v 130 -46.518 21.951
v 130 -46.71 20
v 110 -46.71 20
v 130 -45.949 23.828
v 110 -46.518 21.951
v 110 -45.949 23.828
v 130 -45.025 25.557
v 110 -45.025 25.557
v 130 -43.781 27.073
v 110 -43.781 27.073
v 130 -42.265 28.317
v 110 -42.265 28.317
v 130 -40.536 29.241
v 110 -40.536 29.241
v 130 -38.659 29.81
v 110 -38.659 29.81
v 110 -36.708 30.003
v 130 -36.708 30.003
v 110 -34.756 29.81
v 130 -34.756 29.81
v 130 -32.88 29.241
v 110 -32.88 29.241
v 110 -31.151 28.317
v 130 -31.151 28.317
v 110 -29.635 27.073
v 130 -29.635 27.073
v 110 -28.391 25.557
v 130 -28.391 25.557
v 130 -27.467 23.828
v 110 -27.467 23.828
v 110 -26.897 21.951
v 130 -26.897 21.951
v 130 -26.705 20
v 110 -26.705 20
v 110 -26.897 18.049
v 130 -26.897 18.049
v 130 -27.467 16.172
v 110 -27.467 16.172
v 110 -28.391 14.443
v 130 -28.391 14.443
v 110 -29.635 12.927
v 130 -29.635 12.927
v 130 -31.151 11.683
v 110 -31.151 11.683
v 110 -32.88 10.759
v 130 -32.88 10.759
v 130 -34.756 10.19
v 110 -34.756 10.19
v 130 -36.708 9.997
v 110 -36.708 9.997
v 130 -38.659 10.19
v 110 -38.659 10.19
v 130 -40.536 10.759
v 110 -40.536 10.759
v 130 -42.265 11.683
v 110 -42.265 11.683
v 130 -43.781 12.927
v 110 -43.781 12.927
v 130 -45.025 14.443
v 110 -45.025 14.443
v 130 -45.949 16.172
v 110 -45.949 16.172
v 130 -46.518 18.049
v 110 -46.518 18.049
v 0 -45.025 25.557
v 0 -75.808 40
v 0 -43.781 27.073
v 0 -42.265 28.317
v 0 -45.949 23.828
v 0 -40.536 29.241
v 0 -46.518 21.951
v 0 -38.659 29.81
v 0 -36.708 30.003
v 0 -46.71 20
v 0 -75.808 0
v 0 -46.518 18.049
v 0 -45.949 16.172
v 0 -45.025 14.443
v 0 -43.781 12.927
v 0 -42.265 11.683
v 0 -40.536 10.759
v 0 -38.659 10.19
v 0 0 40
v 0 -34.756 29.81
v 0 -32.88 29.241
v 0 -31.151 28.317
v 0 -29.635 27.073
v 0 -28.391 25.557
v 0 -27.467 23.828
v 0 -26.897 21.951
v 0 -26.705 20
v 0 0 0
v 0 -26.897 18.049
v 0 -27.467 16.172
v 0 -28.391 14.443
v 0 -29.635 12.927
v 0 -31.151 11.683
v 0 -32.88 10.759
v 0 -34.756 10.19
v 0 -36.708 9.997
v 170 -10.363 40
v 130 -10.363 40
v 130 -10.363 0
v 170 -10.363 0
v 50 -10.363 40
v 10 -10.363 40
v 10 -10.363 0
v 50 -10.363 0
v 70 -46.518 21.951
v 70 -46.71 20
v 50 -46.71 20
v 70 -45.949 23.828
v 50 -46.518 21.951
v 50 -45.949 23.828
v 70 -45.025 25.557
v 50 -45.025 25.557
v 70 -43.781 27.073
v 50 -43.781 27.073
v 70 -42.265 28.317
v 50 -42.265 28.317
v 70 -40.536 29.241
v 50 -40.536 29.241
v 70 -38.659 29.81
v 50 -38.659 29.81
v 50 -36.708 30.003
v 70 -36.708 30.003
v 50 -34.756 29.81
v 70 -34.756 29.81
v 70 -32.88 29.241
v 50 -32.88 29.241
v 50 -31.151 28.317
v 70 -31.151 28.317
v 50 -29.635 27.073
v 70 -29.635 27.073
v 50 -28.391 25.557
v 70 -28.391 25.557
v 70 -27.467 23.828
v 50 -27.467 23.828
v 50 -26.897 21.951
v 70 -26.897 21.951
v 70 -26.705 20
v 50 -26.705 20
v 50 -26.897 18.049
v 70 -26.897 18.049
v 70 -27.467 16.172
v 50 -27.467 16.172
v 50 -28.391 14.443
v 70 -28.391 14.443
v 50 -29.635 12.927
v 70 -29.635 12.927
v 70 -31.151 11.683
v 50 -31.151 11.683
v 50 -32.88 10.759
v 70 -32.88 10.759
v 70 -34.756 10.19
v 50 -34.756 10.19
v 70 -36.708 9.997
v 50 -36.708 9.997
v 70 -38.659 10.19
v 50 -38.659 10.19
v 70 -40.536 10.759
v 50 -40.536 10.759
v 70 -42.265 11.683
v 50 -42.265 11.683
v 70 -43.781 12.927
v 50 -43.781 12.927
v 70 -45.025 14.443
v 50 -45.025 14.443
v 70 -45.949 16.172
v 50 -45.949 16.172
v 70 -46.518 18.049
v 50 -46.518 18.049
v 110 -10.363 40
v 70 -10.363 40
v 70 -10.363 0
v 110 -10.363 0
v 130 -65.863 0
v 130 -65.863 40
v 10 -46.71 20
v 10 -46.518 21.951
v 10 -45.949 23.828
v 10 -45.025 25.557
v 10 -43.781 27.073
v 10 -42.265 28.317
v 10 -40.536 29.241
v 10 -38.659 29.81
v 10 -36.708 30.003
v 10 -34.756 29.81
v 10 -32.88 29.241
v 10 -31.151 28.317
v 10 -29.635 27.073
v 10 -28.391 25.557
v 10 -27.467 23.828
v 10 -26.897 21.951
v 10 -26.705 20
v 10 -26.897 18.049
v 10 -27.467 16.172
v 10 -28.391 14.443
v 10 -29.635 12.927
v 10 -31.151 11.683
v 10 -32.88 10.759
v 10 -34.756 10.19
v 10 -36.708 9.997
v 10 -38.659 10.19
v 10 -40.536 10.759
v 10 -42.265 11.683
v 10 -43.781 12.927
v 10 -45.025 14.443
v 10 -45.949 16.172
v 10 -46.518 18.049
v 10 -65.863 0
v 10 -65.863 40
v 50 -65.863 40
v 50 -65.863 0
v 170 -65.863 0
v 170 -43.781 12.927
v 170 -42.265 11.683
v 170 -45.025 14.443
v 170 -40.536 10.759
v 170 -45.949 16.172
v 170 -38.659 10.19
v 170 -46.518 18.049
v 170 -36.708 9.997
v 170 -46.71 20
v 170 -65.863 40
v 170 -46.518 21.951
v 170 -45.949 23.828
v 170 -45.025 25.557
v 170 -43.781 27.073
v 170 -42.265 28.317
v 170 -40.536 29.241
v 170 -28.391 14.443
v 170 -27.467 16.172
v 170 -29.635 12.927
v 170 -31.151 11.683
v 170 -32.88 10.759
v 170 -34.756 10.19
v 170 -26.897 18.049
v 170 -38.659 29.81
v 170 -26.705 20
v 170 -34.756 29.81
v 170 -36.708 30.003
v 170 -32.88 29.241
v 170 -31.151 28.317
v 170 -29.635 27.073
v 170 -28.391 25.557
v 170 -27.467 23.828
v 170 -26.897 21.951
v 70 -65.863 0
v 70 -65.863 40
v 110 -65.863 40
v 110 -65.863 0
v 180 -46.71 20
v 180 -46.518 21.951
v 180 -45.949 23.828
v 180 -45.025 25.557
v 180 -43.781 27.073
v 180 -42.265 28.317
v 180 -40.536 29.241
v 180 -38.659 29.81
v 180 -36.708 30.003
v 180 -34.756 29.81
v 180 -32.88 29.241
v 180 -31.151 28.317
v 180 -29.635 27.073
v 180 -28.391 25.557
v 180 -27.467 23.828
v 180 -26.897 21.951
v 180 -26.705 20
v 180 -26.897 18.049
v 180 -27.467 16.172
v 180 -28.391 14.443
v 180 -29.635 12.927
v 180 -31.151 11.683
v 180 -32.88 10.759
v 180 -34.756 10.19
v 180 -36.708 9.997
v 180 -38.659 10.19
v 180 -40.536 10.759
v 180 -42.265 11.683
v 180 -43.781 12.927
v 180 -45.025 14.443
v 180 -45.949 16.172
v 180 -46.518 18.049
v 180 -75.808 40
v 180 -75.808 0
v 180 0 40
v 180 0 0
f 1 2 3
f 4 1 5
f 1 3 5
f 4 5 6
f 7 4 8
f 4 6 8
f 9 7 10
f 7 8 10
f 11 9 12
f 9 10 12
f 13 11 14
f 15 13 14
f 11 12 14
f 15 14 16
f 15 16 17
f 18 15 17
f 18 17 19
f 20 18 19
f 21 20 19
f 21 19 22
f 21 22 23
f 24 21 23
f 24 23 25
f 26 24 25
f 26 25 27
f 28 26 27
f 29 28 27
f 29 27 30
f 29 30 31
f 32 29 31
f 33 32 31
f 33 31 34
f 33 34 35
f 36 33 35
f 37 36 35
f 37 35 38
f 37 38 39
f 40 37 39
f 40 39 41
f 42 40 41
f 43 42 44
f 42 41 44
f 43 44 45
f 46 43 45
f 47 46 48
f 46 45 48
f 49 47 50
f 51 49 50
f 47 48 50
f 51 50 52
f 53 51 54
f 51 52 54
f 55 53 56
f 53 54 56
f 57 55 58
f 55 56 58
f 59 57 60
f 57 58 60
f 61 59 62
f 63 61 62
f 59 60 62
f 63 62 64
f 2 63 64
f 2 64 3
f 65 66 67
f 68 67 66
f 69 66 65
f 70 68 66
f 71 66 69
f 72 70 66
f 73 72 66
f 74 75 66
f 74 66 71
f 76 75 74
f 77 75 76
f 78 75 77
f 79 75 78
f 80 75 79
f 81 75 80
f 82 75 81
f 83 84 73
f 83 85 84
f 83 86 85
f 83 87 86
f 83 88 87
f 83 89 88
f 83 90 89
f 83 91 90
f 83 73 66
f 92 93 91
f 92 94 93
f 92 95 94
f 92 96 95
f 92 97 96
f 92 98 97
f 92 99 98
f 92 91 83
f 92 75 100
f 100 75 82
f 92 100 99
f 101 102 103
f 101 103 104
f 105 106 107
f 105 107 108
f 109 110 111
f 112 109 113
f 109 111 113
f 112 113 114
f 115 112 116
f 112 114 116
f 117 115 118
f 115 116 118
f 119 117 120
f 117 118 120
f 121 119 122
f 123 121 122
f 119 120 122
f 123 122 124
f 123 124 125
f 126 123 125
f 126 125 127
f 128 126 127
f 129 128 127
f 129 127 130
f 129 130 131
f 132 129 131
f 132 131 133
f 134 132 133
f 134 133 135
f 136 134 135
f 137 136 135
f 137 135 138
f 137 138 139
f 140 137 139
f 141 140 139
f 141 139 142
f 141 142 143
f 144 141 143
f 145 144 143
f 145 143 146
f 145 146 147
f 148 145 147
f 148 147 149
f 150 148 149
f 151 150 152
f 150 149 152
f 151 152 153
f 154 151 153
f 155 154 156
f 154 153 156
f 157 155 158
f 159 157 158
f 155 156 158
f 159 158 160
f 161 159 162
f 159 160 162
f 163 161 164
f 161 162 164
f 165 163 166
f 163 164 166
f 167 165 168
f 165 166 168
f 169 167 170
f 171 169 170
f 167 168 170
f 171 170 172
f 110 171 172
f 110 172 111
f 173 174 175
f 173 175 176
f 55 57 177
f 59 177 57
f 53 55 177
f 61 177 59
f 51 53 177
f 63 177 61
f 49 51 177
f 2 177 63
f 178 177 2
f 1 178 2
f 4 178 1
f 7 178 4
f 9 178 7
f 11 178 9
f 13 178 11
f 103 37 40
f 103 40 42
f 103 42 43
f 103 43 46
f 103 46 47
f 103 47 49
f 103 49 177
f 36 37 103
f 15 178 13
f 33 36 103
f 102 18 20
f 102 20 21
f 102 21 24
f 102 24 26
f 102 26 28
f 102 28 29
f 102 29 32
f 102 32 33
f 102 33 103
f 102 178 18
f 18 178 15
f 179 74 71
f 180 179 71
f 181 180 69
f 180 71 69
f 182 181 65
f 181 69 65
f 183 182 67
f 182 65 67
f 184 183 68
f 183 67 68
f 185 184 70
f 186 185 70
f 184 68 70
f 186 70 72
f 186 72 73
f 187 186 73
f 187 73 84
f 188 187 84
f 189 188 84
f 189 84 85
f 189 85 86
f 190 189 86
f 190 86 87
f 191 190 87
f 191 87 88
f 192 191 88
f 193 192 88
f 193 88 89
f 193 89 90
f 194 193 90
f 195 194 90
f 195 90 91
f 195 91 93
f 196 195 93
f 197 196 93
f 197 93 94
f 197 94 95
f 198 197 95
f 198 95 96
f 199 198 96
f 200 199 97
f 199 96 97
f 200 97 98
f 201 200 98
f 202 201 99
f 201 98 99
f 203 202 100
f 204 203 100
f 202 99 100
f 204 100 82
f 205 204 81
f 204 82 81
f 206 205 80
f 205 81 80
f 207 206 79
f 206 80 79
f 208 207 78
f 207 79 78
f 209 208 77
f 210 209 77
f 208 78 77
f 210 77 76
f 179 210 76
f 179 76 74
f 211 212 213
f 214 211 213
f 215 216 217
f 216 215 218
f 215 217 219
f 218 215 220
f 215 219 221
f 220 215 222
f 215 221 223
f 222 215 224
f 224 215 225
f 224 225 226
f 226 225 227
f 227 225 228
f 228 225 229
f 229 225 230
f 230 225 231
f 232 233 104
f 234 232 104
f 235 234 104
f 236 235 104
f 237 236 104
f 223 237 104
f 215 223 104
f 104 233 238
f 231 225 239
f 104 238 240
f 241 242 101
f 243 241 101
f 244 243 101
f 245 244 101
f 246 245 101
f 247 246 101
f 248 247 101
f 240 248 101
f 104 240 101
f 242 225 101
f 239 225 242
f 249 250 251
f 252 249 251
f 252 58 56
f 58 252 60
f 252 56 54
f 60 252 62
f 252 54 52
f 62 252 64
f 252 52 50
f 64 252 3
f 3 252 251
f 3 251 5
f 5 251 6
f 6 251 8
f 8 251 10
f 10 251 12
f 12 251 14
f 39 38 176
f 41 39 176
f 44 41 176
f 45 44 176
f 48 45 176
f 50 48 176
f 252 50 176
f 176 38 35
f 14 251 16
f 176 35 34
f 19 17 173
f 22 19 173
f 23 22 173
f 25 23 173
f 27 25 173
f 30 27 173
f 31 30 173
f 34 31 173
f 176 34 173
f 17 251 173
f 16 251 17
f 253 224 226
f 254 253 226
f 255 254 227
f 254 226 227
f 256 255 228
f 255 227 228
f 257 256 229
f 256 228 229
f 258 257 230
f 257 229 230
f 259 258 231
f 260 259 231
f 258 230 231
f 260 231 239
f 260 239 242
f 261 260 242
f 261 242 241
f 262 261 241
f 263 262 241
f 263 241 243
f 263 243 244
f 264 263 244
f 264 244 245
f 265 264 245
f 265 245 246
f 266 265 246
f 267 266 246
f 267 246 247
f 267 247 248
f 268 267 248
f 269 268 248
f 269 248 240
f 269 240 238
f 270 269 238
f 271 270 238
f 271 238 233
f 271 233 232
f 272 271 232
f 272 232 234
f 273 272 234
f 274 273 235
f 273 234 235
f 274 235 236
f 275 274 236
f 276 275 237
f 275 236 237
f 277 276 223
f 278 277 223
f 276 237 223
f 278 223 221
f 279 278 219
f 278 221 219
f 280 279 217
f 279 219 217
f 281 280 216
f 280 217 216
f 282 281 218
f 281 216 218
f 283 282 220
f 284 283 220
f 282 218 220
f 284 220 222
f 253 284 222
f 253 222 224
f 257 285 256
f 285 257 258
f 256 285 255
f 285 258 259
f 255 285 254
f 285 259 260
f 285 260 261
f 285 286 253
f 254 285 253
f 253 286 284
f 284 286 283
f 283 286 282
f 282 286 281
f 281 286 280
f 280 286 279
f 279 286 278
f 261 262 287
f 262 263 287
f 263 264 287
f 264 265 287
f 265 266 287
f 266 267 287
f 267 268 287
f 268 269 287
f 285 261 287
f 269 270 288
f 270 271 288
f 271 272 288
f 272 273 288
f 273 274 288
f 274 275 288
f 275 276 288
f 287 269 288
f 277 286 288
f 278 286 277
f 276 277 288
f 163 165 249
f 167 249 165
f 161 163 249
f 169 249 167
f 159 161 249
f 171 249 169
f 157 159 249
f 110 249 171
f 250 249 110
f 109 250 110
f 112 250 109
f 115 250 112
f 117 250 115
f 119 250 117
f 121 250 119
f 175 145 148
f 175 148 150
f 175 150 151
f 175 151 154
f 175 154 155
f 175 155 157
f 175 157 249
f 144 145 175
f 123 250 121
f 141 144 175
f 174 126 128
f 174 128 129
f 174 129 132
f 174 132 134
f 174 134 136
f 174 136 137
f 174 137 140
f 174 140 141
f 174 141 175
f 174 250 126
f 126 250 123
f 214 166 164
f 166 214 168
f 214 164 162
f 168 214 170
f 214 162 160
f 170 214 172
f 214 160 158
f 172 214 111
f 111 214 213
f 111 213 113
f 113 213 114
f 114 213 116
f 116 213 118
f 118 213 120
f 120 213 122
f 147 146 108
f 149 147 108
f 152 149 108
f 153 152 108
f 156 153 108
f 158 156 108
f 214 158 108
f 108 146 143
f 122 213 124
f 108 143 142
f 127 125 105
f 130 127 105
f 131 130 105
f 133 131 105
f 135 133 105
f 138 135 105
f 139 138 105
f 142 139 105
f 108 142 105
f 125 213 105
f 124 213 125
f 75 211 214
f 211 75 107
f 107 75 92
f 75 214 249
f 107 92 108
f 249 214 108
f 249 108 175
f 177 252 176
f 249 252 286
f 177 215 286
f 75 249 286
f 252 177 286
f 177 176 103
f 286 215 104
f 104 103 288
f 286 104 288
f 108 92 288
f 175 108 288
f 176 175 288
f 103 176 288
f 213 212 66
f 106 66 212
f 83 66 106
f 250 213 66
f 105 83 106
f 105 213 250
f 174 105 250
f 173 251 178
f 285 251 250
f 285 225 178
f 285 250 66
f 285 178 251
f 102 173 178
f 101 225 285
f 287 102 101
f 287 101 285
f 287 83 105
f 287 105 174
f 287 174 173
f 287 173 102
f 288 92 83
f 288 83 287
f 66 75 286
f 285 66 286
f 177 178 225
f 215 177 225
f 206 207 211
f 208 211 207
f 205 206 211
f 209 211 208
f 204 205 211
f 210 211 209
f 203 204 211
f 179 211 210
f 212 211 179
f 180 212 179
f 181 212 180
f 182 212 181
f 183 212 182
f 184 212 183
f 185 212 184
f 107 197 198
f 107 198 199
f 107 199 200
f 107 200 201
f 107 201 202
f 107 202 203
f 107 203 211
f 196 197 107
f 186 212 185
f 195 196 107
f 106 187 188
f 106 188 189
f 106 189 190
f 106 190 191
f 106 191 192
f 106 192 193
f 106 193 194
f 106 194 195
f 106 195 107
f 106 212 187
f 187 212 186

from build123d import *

# Parameters (mm, degrees)
SKETCH_W        = 180
SKETCH_H        = 75.807773
PAD_DEPTH       = 40
SKETCH001_W     = 40
SKETCH001_H     = 55.5
POCKET_DEPTH    = 40
SKETCH002_R     = 10.002665
POCKET001_DEPTH = 257


with BuildPart() as part:
    # Sketch → Pad (new body)
    with BuildSketch(Plane.XY):
        with Locations((90, -37.903886)):
            Rectangle(SKETCH_W, SKETCH_H)
    extrude(amount=PAD_DEPTH)

    # Sketch001 (on Face6 of Pad) → Pocket (cut)
    with BuildSketch(Plane.XY.offset(40)):
        with Locations((30, -38.113381)):
            Rectangle(SKETCH001_W, SKETCH001_H)
        with Locations((90, -38.113381)):
            Rectangle(SKETCH001_W, SKETCH001_H)
        with Locations((150, -38.113381)):
            Rectangle(SKETCH001_W, SKETCH001_H)
    extrude(amount=-POCKET_DEPTH, mode=Mode.SUBTRACT)

    # Sketch002 (on Face2 of Pocket) → Pocket001 (cut)
    with BuildSketch(Plane(origin=(0, 0, 0), x_dir=(0, -1, 0), z_dir=(-1, 0, 0))):
        with Locations((36.707787, 20)):
            Circle(SKETCH002_R)
    extrude(amount=-POCKET001_DEPTH, mode=Mode.SUBTRACT)


solid = part.part
